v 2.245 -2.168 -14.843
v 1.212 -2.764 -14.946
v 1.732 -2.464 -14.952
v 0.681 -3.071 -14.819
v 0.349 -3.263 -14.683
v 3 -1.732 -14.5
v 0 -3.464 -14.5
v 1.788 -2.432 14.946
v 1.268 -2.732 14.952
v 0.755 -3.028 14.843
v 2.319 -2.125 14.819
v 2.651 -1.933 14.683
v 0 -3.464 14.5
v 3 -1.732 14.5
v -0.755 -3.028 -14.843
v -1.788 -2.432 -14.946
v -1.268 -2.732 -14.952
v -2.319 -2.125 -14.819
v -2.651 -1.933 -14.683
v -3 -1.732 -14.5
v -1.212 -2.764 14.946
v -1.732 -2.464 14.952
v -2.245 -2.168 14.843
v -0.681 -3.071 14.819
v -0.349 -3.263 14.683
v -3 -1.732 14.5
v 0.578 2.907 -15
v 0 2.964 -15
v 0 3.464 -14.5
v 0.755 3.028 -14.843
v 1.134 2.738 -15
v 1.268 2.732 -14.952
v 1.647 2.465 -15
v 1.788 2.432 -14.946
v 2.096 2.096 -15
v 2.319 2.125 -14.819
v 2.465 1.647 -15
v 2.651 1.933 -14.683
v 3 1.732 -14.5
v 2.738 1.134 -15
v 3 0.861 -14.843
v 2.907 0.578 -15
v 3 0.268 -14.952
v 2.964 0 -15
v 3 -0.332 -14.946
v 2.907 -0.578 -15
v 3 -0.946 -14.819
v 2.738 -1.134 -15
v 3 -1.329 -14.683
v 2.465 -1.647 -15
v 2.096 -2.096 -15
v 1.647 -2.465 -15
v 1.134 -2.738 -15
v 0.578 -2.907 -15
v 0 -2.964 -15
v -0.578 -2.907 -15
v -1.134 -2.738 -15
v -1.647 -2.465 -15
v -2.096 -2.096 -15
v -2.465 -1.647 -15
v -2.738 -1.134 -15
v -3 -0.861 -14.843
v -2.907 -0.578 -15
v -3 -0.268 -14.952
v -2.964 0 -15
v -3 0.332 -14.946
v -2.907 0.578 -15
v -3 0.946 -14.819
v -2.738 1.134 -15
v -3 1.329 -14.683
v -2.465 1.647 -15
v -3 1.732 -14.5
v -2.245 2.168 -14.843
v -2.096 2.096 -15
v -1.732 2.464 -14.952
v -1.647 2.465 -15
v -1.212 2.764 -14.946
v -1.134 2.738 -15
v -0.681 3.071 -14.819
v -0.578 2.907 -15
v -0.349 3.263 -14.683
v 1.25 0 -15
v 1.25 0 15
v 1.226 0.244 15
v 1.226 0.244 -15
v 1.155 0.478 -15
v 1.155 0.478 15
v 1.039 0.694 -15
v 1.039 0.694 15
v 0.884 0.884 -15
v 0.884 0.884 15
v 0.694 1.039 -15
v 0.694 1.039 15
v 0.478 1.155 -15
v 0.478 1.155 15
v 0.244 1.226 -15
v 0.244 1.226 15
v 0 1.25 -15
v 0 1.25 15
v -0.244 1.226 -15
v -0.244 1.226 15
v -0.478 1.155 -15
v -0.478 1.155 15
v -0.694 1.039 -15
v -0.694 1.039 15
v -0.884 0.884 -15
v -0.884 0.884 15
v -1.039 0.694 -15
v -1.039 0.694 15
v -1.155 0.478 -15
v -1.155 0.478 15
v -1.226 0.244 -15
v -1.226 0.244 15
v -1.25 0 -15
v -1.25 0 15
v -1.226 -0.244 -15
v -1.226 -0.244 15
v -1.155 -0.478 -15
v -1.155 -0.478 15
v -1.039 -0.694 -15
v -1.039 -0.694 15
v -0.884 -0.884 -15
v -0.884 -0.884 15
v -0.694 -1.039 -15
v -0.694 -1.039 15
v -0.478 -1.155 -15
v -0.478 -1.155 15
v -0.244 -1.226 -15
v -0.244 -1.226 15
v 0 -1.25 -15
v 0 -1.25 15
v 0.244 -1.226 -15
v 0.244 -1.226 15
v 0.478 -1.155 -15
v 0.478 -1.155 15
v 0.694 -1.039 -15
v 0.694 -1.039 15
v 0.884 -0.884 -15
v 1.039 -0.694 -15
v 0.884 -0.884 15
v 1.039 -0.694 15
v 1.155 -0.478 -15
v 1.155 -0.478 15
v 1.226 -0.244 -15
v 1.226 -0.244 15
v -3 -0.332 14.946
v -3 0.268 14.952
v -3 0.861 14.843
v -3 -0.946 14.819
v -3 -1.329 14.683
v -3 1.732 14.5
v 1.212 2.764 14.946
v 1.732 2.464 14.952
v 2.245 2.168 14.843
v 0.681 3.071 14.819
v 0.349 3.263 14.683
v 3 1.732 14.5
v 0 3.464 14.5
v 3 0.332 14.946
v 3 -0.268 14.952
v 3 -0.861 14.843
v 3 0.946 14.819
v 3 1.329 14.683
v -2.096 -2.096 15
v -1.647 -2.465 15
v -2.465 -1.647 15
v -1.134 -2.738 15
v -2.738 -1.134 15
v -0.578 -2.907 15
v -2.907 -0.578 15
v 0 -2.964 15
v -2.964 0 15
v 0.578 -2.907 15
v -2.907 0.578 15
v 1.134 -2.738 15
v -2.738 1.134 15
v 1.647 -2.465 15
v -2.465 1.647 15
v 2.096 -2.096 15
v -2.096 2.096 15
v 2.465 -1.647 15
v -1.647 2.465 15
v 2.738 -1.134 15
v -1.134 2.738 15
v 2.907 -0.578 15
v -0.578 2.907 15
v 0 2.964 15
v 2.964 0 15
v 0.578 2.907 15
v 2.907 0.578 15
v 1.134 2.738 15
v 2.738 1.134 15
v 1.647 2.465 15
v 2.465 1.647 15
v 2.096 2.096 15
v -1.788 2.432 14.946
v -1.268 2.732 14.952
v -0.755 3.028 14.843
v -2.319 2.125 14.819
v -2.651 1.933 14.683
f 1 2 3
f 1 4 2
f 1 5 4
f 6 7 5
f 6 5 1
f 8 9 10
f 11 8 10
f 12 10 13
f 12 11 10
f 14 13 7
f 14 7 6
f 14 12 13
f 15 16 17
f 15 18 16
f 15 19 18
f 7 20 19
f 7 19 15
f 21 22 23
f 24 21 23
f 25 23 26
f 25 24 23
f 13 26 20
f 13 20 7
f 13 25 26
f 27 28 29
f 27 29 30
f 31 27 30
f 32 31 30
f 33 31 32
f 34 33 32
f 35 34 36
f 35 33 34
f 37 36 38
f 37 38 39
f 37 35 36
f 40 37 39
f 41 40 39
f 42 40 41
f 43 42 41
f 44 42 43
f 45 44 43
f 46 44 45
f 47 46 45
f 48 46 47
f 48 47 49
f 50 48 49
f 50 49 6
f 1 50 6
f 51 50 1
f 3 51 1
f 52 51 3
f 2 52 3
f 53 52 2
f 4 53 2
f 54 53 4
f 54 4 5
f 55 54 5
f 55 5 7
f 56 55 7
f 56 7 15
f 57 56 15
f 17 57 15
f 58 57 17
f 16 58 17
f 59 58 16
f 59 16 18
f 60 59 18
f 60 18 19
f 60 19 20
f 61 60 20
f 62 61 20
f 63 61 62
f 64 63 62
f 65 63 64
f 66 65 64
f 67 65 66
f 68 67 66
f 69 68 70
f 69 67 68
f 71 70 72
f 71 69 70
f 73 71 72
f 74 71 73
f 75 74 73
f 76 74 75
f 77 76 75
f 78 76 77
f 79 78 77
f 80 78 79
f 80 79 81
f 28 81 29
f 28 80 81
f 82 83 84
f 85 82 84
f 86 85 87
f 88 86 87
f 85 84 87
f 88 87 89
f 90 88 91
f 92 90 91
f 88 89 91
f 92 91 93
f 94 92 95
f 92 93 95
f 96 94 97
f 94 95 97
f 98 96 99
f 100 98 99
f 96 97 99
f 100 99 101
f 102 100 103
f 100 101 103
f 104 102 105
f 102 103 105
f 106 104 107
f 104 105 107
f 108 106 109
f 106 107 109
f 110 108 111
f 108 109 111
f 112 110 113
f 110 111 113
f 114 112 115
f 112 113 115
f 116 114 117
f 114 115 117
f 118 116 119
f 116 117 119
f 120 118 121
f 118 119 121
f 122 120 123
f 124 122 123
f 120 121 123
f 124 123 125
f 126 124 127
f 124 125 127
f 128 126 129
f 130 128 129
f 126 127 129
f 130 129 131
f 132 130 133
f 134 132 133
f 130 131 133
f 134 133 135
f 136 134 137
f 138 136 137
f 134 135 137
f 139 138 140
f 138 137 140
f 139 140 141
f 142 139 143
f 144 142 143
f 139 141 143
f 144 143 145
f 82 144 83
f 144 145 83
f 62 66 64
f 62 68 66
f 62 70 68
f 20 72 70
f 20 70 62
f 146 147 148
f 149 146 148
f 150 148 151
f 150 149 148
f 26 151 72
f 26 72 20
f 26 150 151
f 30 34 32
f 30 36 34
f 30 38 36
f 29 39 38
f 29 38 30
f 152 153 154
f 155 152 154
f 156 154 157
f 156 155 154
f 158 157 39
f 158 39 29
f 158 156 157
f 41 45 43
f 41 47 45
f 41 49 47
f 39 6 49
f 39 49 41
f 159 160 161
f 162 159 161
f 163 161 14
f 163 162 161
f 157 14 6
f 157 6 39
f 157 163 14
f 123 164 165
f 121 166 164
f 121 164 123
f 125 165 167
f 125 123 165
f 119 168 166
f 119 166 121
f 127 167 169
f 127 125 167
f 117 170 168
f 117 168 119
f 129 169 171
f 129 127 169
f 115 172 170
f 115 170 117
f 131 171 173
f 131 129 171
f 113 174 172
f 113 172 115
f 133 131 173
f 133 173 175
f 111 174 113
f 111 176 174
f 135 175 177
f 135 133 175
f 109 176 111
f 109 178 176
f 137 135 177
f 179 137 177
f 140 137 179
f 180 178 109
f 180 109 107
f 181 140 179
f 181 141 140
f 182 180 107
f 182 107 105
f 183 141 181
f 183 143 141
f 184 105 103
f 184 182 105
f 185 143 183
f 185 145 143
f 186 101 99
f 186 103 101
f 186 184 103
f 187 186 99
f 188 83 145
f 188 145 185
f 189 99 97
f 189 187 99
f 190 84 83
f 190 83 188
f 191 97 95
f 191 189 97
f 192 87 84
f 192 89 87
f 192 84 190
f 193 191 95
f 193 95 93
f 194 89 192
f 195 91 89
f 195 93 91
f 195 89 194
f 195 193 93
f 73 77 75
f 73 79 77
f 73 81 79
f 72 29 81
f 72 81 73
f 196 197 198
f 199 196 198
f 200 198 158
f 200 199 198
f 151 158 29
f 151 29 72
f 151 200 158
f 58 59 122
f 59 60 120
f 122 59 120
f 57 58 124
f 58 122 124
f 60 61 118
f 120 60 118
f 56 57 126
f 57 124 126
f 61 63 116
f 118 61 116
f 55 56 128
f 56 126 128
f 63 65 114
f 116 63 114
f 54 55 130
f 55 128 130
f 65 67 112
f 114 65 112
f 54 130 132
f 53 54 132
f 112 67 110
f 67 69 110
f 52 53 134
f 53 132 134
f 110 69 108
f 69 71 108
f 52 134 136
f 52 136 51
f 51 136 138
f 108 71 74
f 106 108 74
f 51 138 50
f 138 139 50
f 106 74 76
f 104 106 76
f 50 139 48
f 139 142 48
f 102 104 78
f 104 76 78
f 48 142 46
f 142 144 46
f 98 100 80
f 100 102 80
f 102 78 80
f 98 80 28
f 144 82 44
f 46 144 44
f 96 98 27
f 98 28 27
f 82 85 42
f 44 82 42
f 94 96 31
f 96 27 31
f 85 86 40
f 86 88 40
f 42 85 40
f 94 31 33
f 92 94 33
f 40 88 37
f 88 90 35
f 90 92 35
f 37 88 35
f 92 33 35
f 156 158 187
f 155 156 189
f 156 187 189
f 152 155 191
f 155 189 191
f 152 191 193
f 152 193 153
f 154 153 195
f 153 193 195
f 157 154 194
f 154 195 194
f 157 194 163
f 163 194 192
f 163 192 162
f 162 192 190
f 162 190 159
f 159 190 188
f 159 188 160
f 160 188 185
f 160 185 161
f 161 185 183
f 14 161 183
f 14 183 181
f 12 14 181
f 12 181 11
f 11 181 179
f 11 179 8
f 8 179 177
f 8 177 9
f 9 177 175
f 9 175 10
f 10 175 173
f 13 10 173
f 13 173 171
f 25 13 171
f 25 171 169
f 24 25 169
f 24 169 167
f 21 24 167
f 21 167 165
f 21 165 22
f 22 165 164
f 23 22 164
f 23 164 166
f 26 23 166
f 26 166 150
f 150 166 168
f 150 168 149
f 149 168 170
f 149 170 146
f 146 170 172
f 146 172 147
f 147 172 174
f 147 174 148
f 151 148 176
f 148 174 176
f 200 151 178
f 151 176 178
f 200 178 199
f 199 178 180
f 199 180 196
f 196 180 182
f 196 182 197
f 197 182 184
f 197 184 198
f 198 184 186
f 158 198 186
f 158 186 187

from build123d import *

# Parameters (mm, degrees)
SALIENTE_EXTRUIR1_DEPTH = 15
CROQUIS3_R              = 1.25
CORTAR_EXTRUIR1_DEPTH   = 30


with BuildPart() as part:
    # Croquis1 → Saliente-Extruir1 (new body, symmetric)
    with BuildSketch(Plane.XY):
        Polygon((0, 3.464101615), (-3, 1.732050808), (-3, -1.732050808), (0, -3.464101615), (3, -1.732050808), (3, 1.732050808), align=None)
    extrude(amount=SALIENTE_EXTRUIR1_DEPTH, both=True)

    # Croquis2 → Cortar-Revolución2 (revolve, cut)
    with BuildSketch(Plane(origin=(0, 0, 0), x_dir=(0, 0, -1), z_dir=(1, 0, 0))):
        Polygon((15, 2.964101615), (19.5, 2.964101615), (19.5, 7.964101615), (14.5, 7.964101615), (14.5, 3.464101615), align=None)
        Polygon((-19.5, 2.964101615), (-19.5, 7.964101615), (-14.5, 7.964101615), (-14.5, 3.464101615), (-15, 2.964101615), align=None)
    revolve(axis=Axis((0, 0, 17.803147854), (0, 0, -1)), mode=Mode.SUBTRACT)

    # Croquis3 → Cortar-Extruir1 (cut)
    with BuildSketch(Plane.XY.offset(15)):
        Circle(CROQUIS3_R)
    extrude(amount=-CORTAR_EXTRUIR1_DEPTH, mode=Mode.SUBTRACT)


solid = part.part
